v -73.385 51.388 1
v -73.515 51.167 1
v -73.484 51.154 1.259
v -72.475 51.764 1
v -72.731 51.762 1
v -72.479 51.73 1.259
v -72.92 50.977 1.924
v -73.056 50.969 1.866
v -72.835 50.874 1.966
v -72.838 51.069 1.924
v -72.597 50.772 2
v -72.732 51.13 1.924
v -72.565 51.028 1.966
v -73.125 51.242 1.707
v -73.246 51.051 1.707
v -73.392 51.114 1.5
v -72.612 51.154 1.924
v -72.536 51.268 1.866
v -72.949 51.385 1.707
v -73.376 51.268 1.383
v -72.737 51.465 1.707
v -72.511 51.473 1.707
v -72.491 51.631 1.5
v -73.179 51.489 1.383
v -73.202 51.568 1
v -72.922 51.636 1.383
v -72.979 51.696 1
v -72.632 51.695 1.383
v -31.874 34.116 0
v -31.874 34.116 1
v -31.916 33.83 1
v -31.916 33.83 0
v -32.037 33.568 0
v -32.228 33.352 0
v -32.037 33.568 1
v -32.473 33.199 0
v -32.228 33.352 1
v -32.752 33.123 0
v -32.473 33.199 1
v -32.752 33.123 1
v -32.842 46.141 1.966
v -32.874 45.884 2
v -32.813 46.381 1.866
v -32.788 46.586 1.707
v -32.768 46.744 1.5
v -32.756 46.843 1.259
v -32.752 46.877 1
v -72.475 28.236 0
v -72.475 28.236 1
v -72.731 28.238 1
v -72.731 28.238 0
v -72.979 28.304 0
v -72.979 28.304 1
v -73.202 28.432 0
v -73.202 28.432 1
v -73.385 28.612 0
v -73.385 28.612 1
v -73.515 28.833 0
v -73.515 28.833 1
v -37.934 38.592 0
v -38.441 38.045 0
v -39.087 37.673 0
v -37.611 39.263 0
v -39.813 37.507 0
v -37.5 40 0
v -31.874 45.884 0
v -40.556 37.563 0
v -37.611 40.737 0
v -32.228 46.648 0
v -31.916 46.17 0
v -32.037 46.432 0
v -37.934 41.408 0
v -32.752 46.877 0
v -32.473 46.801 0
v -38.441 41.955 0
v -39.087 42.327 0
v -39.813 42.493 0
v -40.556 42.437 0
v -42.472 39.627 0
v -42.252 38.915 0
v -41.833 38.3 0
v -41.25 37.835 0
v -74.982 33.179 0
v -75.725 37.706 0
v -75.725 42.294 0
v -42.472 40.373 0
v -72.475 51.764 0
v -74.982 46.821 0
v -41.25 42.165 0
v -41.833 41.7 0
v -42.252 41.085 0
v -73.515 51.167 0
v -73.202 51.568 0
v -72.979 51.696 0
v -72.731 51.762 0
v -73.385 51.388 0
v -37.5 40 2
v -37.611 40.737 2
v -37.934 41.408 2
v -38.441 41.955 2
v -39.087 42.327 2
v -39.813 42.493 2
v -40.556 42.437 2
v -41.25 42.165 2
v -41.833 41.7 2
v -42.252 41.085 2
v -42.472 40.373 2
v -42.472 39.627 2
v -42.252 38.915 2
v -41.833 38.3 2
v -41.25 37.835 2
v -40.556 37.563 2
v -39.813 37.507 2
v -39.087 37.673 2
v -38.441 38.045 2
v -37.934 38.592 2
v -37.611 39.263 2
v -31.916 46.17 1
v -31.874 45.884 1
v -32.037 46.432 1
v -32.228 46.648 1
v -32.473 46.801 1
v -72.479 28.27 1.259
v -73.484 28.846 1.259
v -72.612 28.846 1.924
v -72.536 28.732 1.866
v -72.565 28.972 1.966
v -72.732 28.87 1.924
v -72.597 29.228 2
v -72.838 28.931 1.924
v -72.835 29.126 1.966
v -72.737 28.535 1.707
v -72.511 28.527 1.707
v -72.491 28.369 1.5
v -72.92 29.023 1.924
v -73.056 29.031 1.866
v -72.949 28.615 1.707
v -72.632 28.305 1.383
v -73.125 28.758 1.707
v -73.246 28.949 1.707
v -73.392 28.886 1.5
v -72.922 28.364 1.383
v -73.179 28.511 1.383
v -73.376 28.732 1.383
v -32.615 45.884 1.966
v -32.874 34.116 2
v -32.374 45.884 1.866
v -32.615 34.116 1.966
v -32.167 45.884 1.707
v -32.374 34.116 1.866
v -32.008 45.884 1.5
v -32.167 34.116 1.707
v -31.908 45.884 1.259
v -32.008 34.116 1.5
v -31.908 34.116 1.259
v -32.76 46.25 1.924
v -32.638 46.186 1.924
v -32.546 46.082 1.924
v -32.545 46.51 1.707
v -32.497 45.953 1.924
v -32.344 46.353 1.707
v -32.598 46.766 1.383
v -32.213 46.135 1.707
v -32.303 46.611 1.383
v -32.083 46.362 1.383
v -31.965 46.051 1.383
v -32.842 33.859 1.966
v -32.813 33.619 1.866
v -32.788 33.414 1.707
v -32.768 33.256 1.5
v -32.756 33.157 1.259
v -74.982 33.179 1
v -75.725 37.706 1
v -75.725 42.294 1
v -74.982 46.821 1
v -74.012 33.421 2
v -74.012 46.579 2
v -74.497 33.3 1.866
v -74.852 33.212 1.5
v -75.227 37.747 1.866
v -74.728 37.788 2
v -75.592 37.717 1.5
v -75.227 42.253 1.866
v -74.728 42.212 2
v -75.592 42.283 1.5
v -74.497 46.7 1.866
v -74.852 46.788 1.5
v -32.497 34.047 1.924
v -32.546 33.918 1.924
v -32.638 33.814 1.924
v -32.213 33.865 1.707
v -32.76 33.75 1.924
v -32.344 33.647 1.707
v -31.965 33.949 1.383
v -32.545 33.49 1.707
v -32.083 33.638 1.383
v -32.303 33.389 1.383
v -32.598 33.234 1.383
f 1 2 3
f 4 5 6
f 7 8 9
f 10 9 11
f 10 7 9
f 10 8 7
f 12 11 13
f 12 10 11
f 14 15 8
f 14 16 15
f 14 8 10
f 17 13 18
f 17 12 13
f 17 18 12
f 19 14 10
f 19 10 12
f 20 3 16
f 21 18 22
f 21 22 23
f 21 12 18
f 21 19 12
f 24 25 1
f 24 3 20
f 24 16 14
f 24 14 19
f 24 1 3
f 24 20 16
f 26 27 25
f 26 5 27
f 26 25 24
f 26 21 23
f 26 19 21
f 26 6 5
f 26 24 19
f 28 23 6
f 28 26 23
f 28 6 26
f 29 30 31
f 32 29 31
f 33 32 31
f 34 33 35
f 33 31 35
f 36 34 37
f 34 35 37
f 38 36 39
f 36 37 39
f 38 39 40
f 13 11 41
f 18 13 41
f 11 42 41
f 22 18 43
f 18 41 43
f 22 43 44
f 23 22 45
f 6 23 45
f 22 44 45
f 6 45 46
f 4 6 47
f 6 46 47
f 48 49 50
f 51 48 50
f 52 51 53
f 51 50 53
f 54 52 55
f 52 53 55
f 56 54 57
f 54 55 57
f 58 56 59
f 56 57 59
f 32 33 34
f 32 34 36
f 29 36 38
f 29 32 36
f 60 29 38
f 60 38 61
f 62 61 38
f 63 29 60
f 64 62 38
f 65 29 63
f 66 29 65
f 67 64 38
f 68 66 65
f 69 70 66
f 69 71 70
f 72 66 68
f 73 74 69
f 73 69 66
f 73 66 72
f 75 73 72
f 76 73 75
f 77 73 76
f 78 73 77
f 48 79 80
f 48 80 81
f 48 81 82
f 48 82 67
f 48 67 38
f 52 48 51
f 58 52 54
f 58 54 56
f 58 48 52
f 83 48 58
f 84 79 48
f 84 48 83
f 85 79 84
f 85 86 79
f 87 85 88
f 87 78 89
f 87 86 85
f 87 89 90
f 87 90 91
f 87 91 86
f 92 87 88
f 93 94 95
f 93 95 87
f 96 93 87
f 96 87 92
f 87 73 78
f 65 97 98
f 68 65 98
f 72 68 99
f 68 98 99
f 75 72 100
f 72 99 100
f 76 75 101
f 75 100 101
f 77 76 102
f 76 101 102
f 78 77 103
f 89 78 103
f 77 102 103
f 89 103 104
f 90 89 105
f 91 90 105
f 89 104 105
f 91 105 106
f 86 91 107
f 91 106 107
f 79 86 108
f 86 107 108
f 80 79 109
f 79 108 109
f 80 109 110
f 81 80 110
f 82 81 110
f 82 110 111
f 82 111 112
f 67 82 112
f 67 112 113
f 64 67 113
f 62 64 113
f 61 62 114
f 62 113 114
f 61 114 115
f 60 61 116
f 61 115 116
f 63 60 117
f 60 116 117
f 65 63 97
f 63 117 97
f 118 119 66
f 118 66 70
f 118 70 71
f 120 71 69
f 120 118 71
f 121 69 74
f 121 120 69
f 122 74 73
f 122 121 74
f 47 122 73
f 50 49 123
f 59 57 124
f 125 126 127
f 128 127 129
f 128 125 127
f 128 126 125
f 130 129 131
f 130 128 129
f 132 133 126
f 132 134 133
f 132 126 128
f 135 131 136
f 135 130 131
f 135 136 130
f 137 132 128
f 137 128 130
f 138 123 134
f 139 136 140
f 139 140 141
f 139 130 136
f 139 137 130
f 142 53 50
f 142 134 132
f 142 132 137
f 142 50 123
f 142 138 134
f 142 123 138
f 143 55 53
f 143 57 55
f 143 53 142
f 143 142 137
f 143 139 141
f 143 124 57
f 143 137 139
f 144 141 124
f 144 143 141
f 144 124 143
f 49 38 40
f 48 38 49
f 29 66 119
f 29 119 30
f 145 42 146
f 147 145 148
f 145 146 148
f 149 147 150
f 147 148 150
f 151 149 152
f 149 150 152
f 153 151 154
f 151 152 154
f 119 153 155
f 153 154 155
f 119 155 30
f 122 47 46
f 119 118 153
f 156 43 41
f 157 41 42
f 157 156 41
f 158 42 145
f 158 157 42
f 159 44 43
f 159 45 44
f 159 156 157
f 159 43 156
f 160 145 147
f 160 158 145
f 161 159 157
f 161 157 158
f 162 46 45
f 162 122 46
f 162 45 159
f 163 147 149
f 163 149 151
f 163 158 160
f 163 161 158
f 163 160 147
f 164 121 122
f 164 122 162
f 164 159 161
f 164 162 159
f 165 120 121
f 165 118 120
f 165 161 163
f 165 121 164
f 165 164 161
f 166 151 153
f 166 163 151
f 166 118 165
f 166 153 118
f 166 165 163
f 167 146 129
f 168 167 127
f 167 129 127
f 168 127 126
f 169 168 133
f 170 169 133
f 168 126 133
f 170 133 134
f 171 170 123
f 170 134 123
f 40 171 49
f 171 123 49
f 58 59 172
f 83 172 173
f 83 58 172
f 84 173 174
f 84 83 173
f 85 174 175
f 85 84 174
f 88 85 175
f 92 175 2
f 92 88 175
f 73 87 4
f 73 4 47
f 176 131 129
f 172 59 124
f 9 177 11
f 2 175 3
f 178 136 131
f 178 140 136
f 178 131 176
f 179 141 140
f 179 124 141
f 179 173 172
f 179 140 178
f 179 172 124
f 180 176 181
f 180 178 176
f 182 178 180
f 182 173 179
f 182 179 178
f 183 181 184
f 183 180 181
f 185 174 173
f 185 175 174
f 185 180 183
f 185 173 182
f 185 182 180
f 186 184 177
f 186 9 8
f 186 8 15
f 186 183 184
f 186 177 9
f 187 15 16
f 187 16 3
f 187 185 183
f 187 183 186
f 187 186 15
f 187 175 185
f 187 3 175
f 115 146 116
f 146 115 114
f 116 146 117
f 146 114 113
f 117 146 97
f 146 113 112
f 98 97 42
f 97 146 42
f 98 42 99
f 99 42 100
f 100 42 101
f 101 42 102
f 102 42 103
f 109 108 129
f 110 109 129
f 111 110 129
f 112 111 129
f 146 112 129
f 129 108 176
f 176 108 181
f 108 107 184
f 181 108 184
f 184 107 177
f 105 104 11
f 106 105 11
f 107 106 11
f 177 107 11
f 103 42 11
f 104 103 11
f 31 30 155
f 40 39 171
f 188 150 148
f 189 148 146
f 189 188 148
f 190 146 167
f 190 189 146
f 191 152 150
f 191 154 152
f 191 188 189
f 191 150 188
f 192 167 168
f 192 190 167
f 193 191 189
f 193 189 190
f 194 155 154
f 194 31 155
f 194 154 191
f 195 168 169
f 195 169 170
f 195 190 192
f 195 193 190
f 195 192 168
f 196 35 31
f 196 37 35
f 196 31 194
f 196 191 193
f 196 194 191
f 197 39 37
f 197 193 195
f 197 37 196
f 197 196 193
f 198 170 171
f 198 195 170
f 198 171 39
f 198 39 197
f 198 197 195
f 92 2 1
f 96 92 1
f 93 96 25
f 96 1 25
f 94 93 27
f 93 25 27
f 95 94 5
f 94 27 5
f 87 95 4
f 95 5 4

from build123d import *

# Parameters (mm, degrees)
BOSS_EXTRUDE1_DEPTH = 2
FILLET1_R           = 1
FILLET2_R           = 1
SKETCH2_R           = 2.5
CUT_EXTRUDE2_DEPTH  = 2


with BuildPart() as part:
    # Sketch1 → Boss-Extrude1 (new body)
    with BuildSketch(Plane.XY):
        with BuildLine():
            Line((-31.873882869, 46.769006648), (-31.873882869, 33.230993352))
            Line((-31.873882869, 33.230993352), (-73.208494435, 28.145662592))
            ThreePointArc((-73.208494435, 28.145662592), (-75.8185442, 40), (-73.208494435, 51.854337408))
            Line((-73.208494435, 51.854337408), (-31.873882869, 46.769006648))
        make_face()
    extrude(amount=BOSS_EXTRUDE1_DEPTH)

    # Fillet1
    fillet1_edges = [part.edges().sort_by_distance(p)[0] for p in [
        (-73.208494435, 51.854337408, 1),
        (-31.873882869, 46.769006648, 1),
        (-31.873882869, 33.230993352, 1),
        (-73.208494435, 28.145662592, 1),
    ]]
    fillet(fillet1_edges, radius=FILLET1_R)

    # Fillet2
    fillet2_edges = [part.edges().sort_by_distance(p)[0] for p in [
        (-52.613347795, 30.679450349, 2),
        (-75.8185442, 40, 2),
        (-31.873882869, 40, 2),
        (-52.613347795, 49.320549651, 2),
        (-32.124847572, 33.452974438, 2),
        (-32.124847572, 46.547025562, 2),
        (-73.094606247, 51.638989358, 2),
        (-73.094606247, 28.361010642, 2),
    ]]
    fillet(fillet2_edges, radius=FILLET2_R)

    # Sketch2 → Cut-Extrude2 (cut)
    with BuildSketch(Plane.XY.offset(2)):
        with Locations((-40, 40)):
            Circle(SKETCH2_R)
    extrude(amount=-CUT_EXTRUDE2_DEPTH, mode=Mode.SUBTRACT)


solid = part.part
